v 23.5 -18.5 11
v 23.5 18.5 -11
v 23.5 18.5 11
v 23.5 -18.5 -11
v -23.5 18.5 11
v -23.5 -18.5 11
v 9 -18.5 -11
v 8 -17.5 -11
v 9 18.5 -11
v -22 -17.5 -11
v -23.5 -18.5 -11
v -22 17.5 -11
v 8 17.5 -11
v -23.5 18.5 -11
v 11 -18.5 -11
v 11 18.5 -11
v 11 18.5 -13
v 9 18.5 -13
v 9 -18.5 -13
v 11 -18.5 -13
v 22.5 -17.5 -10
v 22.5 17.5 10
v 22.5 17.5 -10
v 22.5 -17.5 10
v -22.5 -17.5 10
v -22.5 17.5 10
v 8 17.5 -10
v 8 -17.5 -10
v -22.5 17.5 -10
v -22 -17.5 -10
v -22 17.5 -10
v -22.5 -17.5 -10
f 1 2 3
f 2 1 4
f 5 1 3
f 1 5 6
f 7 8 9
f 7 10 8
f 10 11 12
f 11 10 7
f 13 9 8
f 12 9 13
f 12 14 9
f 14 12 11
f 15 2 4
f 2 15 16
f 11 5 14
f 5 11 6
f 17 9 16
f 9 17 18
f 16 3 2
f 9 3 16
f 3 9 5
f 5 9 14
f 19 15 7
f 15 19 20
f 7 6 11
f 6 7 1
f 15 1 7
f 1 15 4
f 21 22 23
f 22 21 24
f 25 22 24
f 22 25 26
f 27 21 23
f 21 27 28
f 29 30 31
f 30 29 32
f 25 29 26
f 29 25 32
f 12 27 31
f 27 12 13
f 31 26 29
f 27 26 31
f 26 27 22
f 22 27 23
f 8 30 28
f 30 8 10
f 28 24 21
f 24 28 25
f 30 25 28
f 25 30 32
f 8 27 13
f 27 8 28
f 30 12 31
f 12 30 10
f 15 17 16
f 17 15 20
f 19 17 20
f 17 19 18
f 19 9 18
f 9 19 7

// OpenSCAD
difference ([]){
    cube([47,37,22], center=true);
    translate([0,0,+0]) cube([45,35,20], center=true);
    translate([-7,0,-10]) cube([30,35,40], center=true);
}
    translate([+10,0,-12]) cube([2,37,2], center=true);
